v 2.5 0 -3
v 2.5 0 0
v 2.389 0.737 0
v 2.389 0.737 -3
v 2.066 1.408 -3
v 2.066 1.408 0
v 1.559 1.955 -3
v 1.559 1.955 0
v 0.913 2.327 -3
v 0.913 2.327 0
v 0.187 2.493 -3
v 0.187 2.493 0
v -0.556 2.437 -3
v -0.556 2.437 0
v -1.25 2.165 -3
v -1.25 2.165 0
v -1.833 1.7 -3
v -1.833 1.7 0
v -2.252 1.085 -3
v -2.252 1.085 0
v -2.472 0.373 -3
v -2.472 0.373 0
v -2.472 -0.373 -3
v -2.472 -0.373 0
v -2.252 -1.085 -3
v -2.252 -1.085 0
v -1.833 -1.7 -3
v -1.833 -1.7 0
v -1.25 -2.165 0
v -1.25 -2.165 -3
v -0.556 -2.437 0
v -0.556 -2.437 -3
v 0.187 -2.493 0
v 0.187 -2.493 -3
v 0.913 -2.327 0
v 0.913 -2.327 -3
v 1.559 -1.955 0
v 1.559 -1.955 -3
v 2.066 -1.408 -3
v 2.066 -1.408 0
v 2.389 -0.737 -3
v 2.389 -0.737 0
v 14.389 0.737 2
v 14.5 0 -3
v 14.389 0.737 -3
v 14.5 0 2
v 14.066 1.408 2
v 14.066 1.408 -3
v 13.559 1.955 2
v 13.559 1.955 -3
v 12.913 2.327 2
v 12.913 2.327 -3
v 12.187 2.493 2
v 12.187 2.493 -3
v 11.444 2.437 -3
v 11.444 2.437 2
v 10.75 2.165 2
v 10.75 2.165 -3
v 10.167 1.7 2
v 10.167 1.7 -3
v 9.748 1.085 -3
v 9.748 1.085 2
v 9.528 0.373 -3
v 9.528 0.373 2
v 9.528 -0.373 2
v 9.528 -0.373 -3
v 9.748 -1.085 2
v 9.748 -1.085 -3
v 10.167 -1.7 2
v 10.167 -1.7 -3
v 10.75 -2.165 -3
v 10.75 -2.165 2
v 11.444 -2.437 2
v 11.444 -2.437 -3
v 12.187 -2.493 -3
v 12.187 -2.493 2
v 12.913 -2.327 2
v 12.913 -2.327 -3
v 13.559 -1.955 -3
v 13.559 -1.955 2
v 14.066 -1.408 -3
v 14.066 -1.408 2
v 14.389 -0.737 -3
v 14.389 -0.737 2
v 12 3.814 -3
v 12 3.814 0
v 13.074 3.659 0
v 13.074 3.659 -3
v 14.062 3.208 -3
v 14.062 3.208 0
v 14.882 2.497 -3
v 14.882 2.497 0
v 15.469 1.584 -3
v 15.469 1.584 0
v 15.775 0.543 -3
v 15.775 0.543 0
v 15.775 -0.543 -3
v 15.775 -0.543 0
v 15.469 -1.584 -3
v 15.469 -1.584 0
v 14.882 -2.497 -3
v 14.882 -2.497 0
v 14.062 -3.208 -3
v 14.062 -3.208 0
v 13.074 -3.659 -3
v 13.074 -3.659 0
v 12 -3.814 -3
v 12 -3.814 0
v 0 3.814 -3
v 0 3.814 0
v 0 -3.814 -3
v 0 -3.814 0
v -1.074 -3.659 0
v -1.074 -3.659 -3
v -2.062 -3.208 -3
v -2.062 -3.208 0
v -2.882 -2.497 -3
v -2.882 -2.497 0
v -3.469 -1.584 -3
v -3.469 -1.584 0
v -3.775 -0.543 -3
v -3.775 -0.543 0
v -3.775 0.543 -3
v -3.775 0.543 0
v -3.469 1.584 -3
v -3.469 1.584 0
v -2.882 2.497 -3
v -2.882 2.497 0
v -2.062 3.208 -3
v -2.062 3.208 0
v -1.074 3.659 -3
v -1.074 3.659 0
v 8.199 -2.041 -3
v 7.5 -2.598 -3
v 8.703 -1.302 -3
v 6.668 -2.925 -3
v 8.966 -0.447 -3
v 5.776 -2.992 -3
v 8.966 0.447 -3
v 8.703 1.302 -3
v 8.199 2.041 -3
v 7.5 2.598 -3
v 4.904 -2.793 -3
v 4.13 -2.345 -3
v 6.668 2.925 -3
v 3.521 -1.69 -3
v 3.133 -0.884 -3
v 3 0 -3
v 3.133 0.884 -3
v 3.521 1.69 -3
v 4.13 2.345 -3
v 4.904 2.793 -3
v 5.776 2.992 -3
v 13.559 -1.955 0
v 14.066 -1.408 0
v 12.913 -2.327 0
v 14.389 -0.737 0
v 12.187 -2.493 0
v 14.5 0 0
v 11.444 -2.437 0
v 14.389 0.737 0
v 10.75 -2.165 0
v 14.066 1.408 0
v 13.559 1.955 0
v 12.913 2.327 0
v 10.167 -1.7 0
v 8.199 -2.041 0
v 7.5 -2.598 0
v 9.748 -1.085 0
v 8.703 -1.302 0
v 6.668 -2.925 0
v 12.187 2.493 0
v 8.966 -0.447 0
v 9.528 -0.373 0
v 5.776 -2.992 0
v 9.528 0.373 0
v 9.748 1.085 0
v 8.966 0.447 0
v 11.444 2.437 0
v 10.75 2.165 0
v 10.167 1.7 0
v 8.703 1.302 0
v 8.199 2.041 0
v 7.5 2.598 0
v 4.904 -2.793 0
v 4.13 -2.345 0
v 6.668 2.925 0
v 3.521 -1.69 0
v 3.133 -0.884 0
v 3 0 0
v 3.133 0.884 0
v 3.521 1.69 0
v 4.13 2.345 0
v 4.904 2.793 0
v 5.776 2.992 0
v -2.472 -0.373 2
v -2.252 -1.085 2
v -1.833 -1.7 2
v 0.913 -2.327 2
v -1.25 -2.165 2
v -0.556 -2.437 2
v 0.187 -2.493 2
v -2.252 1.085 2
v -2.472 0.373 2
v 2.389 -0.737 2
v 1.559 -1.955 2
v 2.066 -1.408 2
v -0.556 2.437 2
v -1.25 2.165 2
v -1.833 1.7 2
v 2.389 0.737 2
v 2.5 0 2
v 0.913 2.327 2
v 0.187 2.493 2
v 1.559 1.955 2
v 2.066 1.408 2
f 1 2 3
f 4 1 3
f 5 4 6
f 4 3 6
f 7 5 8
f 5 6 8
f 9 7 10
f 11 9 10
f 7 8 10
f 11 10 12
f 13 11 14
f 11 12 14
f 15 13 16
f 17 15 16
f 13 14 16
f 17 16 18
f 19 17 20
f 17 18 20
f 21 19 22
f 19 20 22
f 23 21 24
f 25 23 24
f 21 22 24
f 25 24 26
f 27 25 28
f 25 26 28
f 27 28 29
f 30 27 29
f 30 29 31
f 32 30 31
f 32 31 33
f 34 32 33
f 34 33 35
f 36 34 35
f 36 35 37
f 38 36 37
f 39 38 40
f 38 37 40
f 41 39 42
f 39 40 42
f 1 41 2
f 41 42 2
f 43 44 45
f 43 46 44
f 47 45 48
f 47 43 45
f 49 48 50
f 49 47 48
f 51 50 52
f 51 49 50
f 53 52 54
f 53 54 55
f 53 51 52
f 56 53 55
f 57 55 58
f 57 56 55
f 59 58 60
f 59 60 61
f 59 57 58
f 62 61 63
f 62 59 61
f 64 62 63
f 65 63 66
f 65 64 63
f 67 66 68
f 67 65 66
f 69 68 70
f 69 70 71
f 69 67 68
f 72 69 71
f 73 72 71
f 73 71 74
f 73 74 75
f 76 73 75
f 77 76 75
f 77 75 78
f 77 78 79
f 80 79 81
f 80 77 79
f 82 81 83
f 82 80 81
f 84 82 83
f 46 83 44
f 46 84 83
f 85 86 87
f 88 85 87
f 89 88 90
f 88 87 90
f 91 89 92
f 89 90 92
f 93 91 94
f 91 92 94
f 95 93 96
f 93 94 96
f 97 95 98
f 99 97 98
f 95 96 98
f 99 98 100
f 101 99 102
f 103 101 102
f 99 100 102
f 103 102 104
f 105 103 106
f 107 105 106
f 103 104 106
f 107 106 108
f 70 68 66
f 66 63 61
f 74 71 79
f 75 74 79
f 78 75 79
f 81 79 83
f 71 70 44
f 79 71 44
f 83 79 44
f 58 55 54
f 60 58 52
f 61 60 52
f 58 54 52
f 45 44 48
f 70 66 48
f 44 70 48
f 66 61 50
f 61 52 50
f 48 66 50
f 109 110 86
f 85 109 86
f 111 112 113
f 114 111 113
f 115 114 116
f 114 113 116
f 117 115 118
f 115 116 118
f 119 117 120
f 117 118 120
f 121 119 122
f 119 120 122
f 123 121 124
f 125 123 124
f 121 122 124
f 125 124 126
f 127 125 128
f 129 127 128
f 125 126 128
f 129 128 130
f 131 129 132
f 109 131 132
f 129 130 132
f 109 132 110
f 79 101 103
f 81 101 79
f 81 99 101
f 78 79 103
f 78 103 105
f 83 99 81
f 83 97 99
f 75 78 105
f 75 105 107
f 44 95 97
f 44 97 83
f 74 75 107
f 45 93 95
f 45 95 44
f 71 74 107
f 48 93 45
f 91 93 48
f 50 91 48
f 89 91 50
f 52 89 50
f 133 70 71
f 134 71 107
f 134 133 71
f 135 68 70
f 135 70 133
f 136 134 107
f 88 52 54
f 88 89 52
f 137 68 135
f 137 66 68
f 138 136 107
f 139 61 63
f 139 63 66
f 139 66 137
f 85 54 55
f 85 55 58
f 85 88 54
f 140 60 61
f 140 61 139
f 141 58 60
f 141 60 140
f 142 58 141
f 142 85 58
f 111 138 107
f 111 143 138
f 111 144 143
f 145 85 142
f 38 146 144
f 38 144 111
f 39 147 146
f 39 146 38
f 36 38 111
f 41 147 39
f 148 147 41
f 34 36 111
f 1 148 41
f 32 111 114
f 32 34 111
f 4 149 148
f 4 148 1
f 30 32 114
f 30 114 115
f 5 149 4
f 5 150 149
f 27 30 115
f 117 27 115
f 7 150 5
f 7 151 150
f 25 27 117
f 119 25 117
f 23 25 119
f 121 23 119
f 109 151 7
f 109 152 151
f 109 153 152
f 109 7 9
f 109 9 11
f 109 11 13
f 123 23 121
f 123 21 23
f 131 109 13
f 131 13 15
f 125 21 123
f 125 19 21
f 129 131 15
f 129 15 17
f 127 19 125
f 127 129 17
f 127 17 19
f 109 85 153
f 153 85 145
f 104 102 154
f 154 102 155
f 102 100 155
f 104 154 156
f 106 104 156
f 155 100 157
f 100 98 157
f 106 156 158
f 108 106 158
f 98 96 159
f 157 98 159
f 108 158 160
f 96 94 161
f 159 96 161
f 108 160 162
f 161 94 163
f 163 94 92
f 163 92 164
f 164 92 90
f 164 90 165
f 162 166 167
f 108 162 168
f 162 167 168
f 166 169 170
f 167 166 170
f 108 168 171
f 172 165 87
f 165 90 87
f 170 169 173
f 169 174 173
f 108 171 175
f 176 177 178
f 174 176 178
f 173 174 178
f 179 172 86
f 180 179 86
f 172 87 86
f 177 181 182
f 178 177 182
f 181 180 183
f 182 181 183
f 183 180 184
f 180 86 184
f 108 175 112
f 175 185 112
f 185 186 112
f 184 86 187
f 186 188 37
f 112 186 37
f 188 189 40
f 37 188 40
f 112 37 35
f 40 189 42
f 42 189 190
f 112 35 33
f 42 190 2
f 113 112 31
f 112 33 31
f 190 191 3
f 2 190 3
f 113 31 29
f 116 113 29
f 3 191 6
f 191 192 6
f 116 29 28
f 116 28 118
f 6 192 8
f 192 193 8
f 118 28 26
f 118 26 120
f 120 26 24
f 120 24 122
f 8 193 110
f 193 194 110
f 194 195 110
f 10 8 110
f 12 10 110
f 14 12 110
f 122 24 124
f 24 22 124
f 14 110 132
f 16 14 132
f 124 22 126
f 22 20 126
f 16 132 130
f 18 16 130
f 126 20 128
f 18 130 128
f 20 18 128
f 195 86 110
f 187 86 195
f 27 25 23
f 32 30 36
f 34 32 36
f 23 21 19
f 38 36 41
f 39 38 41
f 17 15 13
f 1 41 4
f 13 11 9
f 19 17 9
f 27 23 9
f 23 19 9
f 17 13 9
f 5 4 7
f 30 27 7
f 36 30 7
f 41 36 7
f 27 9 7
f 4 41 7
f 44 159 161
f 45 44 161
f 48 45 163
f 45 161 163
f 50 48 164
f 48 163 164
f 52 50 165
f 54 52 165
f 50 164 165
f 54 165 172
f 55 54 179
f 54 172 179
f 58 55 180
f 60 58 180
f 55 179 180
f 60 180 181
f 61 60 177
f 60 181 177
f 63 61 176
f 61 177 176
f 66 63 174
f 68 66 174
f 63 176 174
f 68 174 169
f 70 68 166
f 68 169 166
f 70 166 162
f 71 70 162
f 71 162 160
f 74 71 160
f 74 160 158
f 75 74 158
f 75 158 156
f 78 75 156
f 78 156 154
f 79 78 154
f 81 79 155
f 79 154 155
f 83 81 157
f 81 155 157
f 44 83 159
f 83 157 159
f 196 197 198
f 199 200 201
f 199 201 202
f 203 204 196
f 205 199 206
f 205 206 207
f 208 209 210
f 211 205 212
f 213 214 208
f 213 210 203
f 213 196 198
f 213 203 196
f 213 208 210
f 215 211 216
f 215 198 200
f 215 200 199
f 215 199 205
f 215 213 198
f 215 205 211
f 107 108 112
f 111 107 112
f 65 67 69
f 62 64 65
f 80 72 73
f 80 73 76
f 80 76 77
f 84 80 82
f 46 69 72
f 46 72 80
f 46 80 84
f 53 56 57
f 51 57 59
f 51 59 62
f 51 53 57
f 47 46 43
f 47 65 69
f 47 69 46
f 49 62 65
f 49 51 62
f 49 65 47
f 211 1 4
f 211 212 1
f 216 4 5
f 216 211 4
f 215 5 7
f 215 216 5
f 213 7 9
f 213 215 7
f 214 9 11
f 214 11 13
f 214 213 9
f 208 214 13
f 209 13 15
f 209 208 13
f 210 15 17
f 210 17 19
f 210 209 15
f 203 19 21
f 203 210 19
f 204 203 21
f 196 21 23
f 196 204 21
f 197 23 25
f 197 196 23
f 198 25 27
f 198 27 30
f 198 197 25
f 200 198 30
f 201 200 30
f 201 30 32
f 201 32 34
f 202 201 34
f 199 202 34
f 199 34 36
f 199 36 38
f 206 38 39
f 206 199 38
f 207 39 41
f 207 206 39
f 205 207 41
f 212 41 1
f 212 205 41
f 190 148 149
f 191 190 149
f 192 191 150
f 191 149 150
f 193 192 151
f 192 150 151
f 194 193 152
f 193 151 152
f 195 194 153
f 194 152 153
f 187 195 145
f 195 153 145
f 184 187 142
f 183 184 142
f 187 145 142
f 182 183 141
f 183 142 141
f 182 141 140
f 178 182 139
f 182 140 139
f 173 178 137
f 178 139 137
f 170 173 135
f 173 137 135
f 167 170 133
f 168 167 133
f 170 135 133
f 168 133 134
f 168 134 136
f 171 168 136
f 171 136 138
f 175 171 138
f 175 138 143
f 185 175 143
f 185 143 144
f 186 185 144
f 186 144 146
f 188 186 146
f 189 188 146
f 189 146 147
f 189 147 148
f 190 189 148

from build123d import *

# Parameters (mm, degrees)
SKETCH1_R                  = 2.5
BOSS_EXTRUDE1_DEPTH        = 3
SKETCH1_2_R                = 2.5
BOSS_EXTRUDE2_DEPTH        = 2
BOSS_EXTRUDE2_DEPTH_BACK   = 3
BOSS_EXTRUDE2_2_DEPTH      = 2
BOSS_EXTRUDE2_2_DEPTH_BACK = 3
SKETCH2_R                  = 3
CUT_EXTRUDE1_DEPTH         = 6


with BuildPart() as part:
    # Sketch1 → Boss-Extrude1 (new body)
    with BuildSketch(Plane.XY):
        with BuildLine():
            Line((0, 3.813559322), (12, 3.813559322))
            ThreePointArc((12, 3.813559322), (15.813559322, 0), (12, -3.813559322))
            Line((12, -3.813559322), (0, -3.813559322))
            ThreePointArc((0, -3.813559322), (-3.813559322, 0), (0, 3.813559322))
        make_face()
        Circle(SKETCH1_R, mode=Mode.SUBTRACT)
        with Locations((12, 0)):
            Circle(SKETCH1_R, mode=Mode.SUBTRACT)
    extrude(amount=-BOSS_EXTRUDE1_DEPTH)

    # Sketch2 → Cut-Extrude1 (cut, through all)
    with BuildSketch(Plane(origin=(0, 0, -3), x_dir=(-1, 0, 0), z_dir=(0, 0, -1))):
        with Locations((-6, 0)):
            Circle(SKETCH2_R)
    extrude(amount=-CUT_EXTRUDE1_DEPTH, mode=Mode.SUBTRACT)


with BuildPart() as body_2:
    # Sketch1<2> → Boss-Extrude2 (new body, two sides)
    with BuildSketch(Plane.XY) as boss_extrude2_sk:
        Circle(SKETCH1_2_R)
    extrude(amount=BOSS_EXTRUDE2_DEPTH)
    extrude(boss_extrude2_sk.sketch, amount=-BOSS_EXTRUDE2_DEPTH_BACK)


with BuildPart() as body_3:
    # Sketch1<2> → Boss-Extrude2 2 (new body, two sides)
    with BuildSketch(Plane.XY) as boss_extrude2_2_sk:
        with Locations((12, 0)):
            Circle(SKETCH1_2_R)
    extrude(amount=BOSS_EXTRUDE2_2_DEPTH)
    extrude(boss_extrude2_2_sk.sketch, amount=-BOSS_EXTRUDE2_2_DEPTH_BACK)


solid = Compound([part.part, body_2.part, body_3.part])
